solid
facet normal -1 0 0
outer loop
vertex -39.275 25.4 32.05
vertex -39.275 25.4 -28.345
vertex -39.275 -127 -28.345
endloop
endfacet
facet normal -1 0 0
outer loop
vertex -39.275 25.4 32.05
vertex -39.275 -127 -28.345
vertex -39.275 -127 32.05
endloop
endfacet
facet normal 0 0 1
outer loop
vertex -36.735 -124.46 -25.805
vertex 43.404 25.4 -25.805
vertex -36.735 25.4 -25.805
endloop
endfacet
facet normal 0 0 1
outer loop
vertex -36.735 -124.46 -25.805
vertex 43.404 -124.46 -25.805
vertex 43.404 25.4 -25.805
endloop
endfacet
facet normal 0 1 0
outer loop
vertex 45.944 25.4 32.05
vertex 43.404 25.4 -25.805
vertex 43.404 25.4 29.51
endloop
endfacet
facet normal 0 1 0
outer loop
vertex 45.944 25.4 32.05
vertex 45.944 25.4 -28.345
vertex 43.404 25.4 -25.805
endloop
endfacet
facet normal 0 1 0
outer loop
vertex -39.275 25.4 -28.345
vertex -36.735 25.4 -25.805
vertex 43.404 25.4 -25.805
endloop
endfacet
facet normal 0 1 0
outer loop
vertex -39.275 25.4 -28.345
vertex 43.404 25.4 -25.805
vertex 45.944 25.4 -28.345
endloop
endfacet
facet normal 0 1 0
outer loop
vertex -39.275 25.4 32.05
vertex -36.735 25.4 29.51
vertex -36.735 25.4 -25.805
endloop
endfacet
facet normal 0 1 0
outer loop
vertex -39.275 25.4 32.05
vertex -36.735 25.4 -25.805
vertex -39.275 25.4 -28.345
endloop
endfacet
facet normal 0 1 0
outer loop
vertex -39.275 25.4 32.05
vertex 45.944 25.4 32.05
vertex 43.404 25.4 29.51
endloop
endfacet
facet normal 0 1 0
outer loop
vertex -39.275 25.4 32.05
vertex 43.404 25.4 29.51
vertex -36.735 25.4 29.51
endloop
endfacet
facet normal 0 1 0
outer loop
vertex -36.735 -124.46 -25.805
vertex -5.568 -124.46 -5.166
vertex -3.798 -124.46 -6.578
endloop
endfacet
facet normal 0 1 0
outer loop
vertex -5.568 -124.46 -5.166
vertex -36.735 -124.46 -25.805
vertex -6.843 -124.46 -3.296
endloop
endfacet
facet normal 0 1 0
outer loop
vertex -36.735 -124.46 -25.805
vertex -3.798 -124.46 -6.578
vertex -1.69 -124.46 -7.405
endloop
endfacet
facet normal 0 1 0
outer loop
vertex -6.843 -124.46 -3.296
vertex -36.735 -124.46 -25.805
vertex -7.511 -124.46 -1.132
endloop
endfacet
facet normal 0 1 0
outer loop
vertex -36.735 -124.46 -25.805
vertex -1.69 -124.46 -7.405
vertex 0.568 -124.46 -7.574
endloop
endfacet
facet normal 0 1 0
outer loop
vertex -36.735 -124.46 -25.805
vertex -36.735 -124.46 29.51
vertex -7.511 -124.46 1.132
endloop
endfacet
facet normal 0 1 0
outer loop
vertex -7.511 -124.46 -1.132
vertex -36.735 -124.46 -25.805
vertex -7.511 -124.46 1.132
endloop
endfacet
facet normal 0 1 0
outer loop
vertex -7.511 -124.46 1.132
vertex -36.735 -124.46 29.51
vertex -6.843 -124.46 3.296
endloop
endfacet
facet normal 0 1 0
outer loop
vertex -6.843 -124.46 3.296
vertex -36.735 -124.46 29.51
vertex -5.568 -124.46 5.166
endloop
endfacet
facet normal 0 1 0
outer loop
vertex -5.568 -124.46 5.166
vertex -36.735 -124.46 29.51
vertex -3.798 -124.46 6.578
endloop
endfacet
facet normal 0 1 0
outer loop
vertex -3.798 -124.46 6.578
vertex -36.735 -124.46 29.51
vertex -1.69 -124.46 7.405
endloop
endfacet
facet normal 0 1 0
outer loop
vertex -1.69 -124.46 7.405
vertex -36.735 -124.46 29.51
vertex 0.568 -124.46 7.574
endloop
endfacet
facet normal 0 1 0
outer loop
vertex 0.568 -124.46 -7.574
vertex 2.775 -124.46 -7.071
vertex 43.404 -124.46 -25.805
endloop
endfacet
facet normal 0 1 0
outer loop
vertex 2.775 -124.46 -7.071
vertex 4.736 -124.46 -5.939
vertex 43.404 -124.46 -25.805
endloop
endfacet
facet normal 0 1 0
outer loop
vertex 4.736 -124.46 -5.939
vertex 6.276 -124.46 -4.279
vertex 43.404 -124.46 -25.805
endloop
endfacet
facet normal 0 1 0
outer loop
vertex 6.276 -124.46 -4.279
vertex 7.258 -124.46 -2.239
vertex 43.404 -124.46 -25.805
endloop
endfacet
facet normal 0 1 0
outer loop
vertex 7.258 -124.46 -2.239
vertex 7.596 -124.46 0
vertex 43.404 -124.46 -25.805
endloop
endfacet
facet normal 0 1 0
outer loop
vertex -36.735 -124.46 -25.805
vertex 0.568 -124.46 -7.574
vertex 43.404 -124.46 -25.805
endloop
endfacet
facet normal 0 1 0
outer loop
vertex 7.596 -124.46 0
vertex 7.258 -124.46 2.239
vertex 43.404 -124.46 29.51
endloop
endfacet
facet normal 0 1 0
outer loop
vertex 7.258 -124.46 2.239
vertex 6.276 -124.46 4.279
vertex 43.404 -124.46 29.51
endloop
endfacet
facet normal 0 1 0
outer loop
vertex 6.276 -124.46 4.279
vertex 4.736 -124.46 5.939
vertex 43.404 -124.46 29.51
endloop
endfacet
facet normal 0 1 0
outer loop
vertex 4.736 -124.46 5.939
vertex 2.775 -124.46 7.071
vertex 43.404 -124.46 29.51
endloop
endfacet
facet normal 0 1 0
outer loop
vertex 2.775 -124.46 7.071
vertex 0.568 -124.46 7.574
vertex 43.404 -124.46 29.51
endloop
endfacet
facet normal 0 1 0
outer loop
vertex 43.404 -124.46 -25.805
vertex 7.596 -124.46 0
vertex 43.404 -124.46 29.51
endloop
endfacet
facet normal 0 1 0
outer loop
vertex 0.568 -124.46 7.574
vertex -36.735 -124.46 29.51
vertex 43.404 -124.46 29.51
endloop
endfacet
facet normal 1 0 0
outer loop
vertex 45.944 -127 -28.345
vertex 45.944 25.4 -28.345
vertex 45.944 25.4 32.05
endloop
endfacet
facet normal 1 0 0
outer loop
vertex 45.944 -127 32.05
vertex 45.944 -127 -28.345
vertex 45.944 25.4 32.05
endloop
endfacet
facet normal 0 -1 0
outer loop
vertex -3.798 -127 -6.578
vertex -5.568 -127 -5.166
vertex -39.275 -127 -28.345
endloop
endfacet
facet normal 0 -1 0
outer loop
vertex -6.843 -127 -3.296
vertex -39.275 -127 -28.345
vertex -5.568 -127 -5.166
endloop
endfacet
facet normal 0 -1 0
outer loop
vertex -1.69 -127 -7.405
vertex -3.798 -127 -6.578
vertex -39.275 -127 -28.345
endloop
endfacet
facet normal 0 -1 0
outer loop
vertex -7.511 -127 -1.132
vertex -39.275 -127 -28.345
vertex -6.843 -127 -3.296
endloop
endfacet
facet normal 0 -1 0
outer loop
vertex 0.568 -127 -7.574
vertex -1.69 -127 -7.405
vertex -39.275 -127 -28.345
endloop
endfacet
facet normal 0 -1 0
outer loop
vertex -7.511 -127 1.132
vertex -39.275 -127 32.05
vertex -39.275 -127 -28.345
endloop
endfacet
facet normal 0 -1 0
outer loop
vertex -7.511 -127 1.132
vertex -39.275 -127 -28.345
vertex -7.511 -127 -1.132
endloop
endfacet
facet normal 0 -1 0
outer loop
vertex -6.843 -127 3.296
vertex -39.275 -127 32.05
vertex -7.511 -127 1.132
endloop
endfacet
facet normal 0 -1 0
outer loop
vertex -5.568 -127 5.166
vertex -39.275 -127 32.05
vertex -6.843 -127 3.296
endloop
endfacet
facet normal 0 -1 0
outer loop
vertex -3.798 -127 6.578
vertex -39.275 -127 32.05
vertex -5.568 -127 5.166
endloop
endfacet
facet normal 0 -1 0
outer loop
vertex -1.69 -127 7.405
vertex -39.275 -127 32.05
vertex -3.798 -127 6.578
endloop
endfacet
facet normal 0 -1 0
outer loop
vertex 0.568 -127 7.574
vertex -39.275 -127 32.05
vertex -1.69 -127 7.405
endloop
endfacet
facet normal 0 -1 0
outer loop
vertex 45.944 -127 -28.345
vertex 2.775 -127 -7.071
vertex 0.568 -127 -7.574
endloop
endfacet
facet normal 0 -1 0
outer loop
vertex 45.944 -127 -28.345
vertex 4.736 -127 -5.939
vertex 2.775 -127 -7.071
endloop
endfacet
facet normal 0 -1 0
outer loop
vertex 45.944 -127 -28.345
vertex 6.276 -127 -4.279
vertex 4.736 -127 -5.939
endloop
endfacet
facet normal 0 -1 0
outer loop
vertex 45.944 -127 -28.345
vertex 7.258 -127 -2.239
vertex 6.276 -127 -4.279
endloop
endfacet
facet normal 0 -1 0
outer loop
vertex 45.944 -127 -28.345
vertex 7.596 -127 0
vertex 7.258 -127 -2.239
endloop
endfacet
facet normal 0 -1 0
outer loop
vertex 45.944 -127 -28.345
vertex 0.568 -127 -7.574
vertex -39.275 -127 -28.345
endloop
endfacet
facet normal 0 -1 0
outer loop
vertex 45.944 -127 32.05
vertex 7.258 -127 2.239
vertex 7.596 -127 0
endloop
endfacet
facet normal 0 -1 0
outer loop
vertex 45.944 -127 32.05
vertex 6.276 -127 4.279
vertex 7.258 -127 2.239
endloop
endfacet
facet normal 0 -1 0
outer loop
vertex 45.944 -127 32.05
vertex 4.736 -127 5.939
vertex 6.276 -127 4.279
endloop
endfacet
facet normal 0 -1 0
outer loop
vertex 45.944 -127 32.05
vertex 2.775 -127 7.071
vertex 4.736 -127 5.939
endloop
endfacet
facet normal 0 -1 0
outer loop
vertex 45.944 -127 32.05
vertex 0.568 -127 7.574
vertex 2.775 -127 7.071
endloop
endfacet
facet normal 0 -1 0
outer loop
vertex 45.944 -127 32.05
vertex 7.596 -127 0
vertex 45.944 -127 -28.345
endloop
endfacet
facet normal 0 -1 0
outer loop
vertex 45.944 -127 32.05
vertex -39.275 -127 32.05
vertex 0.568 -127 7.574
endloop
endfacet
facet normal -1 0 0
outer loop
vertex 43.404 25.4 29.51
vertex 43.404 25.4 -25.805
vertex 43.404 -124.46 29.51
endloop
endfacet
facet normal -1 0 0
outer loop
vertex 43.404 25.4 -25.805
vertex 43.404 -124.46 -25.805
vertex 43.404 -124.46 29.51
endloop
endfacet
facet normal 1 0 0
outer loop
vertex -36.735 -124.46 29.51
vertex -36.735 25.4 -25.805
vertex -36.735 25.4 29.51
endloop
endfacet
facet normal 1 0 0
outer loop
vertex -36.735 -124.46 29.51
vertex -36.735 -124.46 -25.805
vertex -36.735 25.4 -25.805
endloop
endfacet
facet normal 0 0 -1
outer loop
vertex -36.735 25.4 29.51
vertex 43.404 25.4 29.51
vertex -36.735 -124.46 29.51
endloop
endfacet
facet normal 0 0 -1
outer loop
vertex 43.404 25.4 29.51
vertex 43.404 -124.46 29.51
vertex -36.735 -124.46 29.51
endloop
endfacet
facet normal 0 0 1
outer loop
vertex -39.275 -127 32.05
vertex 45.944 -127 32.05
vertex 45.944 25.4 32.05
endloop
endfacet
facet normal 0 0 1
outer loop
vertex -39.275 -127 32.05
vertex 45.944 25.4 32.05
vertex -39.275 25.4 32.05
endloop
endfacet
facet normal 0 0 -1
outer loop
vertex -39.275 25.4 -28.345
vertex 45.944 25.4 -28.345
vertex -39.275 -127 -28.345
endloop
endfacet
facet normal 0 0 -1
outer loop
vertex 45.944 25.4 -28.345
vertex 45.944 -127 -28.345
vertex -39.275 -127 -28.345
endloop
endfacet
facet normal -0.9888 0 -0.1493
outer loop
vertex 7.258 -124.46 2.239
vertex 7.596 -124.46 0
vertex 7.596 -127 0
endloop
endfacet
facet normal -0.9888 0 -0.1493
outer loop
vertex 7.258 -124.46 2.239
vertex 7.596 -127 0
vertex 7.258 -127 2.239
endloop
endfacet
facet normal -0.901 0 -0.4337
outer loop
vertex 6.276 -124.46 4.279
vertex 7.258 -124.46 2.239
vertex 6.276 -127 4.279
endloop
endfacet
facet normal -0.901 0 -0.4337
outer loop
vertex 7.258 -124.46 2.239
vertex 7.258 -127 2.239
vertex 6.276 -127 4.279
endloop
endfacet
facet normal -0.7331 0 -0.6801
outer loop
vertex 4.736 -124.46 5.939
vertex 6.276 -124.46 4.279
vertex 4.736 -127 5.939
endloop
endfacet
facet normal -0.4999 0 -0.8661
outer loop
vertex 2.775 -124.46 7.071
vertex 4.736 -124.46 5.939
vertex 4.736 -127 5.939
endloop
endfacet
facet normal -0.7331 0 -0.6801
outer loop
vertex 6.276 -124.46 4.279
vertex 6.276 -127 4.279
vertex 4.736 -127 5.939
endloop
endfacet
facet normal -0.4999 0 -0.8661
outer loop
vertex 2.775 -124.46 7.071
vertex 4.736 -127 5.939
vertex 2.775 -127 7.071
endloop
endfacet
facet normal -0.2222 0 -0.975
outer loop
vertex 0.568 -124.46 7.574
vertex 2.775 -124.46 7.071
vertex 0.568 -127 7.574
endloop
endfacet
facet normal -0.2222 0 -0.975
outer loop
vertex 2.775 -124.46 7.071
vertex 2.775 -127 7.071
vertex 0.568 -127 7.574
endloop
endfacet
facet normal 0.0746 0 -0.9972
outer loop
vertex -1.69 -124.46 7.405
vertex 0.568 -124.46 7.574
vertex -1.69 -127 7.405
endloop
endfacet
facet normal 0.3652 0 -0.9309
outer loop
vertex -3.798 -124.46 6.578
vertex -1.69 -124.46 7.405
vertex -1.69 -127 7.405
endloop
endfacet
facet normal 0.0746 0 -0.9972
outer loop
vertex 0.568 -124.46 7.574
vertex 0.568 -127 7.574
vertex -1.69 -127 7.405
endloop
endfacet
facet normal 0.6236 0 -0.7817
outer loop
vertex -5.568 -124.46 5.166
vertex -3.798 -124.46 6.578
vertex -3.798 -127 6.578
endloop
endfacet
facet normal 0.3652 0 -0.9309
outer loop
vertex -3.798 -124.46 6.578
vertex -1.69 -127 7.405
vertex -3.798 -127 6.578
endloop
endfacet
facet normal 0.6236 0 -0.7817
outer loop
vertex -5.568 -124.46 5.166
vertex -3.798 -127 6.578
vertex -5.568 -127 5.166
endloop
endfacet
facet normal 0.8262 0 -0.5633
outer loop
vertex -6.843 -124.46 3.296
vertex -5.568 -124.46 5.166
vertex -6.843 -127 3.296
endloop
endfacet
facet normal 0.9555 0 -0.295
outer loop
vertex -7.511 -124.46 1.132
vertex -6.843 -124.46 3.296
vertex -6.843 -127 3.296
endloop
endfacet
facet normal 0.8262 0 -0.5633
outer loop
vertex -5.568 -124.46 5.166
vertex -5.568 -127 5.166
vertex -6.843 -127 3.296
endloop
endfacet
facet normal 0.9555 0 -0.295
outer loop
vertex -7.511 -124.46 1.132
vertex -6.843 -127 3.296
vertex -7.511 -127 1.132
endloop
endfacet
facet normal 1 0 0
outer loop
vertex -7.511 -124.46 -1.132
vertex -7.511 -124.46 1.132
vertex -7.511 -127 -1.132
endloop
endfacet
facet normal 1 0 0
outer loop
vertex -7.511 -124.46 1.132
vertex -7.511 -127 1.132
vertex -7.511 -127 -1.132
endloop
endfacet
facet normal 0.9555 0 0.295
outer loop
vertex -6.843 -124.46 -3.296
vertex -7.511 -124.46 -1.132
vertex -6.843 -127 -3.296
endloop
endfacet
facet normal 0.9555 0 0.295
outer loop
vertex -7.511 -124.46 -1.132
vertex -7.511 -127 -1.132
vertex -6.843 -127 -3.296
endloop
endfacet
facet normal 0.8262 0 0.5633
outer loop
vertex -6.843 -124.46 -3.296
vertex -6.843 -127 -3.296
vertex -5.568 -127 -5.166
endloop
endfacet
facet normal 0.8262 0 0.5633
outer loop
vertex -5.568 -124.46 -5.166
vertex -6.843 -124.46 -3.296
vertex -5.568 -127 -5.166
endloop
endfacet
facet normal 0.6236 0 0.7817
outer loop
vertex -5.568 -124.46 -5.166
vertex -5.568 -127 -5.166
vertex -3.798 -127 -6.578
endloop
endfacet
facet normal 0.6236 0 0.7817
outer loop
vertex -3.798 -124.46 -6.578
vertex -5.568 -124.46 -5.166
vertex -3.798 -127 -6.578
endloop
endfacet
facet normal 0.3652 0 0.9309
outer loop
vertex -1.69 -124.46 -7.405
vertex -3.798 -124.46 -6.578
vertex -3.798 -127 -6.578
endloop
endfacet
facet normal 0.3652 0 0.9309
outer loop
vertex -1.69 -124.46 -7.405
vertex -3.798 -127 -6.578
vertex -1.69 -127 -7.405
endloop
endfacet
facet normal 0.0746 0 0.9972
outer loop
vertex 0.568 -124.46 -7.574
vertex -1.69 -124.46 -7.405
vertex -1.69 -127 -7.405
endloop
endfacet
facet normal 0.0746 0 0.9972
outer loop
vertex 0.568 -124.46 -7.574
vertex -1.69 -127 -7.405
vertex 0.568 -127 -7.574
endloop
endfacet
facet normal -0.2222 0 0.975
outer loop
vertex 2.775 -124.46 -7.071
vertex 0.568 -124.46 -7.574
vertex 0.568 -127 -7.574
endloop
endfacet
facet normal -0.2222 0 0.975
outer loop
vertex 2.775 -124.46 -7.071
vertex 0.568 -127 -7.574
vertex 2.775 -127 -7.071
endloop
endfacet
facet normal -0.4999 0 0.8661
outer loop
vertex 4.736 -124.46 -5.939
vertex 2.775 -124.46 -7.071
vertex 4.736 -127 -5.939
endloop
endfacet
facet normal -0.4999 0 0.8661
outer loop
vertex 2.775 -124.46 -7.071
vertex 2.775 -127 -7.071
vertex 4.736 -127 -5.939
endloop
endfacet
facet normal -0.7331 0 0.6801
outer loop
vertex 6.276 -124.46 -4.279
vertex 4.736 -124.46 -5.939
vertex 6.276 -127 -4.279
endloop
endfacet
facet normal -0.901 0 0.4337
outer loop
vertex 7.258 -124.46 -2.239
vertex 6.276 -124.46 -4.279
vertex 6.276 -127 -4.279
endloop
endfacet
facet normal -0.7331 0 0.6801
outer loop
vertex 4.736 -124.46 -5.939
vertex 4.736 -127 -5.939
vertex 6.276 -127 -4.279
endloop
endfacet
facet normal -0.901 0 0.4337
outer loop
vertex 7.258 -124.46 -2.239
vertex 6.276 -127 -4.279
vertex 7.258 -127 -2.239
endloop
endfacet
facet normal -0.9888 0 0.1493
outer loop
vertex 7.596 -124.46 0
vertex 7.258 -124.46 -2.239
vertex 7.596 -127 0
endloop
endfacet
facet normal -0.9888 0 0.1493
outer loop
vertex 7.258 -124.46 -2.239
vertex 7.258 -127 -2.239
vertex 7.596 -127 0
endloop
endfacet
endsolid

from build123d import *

# Parameters (mm, degrees)
F0_W     = 85.2193273604
F0_H     = 60.3945683688
F1_DEPTH = 127
F2_W     = 85.2193273604
F2_H     = 60.3945683688
F3_DEPTH = 25.4
F4_T     = -2.54
F5_R     = 7.5956350192
F6_DEPTH = 127


with BuildPart() as f1:
    # F0 (on Front) → F1 (new body)
    with BuildSketch(Plane.XZ):
        with Locations((3.3346693963, 1.852591522)):
            Rectangle(F0_W, F0_H)
    extrude(amount=F1_DEPTH)

    # F2 (on face) → F3 (join)
    with BuildSketch(Plane(origin=(0, 0, 0), x_dir=(-1, 0, 0), z_dir=(0, 1, 0))):
        with Locations((-3.3346693963, 1.852591522)):
            Rectangle(F2_W, F2_H)
    extrude(amount=F3_DEPTH)

    # F4
    f4_openings = [f1.faces().sort_by_distance(p)[0] for p in [
        (3.334669, 25.4, 1.852592),
    ]]
    offset(amount=F4_T, openings=f4_openings)

    # F5 (on Front) → F6 (cut, symmetric)
    with BuildSketch(Plane.XZ):
        Circle(F5_R)
    extrude(amount=F6_DEPTH, both=True, mode=Mode.SUBTRACT)


solid = f1.part
